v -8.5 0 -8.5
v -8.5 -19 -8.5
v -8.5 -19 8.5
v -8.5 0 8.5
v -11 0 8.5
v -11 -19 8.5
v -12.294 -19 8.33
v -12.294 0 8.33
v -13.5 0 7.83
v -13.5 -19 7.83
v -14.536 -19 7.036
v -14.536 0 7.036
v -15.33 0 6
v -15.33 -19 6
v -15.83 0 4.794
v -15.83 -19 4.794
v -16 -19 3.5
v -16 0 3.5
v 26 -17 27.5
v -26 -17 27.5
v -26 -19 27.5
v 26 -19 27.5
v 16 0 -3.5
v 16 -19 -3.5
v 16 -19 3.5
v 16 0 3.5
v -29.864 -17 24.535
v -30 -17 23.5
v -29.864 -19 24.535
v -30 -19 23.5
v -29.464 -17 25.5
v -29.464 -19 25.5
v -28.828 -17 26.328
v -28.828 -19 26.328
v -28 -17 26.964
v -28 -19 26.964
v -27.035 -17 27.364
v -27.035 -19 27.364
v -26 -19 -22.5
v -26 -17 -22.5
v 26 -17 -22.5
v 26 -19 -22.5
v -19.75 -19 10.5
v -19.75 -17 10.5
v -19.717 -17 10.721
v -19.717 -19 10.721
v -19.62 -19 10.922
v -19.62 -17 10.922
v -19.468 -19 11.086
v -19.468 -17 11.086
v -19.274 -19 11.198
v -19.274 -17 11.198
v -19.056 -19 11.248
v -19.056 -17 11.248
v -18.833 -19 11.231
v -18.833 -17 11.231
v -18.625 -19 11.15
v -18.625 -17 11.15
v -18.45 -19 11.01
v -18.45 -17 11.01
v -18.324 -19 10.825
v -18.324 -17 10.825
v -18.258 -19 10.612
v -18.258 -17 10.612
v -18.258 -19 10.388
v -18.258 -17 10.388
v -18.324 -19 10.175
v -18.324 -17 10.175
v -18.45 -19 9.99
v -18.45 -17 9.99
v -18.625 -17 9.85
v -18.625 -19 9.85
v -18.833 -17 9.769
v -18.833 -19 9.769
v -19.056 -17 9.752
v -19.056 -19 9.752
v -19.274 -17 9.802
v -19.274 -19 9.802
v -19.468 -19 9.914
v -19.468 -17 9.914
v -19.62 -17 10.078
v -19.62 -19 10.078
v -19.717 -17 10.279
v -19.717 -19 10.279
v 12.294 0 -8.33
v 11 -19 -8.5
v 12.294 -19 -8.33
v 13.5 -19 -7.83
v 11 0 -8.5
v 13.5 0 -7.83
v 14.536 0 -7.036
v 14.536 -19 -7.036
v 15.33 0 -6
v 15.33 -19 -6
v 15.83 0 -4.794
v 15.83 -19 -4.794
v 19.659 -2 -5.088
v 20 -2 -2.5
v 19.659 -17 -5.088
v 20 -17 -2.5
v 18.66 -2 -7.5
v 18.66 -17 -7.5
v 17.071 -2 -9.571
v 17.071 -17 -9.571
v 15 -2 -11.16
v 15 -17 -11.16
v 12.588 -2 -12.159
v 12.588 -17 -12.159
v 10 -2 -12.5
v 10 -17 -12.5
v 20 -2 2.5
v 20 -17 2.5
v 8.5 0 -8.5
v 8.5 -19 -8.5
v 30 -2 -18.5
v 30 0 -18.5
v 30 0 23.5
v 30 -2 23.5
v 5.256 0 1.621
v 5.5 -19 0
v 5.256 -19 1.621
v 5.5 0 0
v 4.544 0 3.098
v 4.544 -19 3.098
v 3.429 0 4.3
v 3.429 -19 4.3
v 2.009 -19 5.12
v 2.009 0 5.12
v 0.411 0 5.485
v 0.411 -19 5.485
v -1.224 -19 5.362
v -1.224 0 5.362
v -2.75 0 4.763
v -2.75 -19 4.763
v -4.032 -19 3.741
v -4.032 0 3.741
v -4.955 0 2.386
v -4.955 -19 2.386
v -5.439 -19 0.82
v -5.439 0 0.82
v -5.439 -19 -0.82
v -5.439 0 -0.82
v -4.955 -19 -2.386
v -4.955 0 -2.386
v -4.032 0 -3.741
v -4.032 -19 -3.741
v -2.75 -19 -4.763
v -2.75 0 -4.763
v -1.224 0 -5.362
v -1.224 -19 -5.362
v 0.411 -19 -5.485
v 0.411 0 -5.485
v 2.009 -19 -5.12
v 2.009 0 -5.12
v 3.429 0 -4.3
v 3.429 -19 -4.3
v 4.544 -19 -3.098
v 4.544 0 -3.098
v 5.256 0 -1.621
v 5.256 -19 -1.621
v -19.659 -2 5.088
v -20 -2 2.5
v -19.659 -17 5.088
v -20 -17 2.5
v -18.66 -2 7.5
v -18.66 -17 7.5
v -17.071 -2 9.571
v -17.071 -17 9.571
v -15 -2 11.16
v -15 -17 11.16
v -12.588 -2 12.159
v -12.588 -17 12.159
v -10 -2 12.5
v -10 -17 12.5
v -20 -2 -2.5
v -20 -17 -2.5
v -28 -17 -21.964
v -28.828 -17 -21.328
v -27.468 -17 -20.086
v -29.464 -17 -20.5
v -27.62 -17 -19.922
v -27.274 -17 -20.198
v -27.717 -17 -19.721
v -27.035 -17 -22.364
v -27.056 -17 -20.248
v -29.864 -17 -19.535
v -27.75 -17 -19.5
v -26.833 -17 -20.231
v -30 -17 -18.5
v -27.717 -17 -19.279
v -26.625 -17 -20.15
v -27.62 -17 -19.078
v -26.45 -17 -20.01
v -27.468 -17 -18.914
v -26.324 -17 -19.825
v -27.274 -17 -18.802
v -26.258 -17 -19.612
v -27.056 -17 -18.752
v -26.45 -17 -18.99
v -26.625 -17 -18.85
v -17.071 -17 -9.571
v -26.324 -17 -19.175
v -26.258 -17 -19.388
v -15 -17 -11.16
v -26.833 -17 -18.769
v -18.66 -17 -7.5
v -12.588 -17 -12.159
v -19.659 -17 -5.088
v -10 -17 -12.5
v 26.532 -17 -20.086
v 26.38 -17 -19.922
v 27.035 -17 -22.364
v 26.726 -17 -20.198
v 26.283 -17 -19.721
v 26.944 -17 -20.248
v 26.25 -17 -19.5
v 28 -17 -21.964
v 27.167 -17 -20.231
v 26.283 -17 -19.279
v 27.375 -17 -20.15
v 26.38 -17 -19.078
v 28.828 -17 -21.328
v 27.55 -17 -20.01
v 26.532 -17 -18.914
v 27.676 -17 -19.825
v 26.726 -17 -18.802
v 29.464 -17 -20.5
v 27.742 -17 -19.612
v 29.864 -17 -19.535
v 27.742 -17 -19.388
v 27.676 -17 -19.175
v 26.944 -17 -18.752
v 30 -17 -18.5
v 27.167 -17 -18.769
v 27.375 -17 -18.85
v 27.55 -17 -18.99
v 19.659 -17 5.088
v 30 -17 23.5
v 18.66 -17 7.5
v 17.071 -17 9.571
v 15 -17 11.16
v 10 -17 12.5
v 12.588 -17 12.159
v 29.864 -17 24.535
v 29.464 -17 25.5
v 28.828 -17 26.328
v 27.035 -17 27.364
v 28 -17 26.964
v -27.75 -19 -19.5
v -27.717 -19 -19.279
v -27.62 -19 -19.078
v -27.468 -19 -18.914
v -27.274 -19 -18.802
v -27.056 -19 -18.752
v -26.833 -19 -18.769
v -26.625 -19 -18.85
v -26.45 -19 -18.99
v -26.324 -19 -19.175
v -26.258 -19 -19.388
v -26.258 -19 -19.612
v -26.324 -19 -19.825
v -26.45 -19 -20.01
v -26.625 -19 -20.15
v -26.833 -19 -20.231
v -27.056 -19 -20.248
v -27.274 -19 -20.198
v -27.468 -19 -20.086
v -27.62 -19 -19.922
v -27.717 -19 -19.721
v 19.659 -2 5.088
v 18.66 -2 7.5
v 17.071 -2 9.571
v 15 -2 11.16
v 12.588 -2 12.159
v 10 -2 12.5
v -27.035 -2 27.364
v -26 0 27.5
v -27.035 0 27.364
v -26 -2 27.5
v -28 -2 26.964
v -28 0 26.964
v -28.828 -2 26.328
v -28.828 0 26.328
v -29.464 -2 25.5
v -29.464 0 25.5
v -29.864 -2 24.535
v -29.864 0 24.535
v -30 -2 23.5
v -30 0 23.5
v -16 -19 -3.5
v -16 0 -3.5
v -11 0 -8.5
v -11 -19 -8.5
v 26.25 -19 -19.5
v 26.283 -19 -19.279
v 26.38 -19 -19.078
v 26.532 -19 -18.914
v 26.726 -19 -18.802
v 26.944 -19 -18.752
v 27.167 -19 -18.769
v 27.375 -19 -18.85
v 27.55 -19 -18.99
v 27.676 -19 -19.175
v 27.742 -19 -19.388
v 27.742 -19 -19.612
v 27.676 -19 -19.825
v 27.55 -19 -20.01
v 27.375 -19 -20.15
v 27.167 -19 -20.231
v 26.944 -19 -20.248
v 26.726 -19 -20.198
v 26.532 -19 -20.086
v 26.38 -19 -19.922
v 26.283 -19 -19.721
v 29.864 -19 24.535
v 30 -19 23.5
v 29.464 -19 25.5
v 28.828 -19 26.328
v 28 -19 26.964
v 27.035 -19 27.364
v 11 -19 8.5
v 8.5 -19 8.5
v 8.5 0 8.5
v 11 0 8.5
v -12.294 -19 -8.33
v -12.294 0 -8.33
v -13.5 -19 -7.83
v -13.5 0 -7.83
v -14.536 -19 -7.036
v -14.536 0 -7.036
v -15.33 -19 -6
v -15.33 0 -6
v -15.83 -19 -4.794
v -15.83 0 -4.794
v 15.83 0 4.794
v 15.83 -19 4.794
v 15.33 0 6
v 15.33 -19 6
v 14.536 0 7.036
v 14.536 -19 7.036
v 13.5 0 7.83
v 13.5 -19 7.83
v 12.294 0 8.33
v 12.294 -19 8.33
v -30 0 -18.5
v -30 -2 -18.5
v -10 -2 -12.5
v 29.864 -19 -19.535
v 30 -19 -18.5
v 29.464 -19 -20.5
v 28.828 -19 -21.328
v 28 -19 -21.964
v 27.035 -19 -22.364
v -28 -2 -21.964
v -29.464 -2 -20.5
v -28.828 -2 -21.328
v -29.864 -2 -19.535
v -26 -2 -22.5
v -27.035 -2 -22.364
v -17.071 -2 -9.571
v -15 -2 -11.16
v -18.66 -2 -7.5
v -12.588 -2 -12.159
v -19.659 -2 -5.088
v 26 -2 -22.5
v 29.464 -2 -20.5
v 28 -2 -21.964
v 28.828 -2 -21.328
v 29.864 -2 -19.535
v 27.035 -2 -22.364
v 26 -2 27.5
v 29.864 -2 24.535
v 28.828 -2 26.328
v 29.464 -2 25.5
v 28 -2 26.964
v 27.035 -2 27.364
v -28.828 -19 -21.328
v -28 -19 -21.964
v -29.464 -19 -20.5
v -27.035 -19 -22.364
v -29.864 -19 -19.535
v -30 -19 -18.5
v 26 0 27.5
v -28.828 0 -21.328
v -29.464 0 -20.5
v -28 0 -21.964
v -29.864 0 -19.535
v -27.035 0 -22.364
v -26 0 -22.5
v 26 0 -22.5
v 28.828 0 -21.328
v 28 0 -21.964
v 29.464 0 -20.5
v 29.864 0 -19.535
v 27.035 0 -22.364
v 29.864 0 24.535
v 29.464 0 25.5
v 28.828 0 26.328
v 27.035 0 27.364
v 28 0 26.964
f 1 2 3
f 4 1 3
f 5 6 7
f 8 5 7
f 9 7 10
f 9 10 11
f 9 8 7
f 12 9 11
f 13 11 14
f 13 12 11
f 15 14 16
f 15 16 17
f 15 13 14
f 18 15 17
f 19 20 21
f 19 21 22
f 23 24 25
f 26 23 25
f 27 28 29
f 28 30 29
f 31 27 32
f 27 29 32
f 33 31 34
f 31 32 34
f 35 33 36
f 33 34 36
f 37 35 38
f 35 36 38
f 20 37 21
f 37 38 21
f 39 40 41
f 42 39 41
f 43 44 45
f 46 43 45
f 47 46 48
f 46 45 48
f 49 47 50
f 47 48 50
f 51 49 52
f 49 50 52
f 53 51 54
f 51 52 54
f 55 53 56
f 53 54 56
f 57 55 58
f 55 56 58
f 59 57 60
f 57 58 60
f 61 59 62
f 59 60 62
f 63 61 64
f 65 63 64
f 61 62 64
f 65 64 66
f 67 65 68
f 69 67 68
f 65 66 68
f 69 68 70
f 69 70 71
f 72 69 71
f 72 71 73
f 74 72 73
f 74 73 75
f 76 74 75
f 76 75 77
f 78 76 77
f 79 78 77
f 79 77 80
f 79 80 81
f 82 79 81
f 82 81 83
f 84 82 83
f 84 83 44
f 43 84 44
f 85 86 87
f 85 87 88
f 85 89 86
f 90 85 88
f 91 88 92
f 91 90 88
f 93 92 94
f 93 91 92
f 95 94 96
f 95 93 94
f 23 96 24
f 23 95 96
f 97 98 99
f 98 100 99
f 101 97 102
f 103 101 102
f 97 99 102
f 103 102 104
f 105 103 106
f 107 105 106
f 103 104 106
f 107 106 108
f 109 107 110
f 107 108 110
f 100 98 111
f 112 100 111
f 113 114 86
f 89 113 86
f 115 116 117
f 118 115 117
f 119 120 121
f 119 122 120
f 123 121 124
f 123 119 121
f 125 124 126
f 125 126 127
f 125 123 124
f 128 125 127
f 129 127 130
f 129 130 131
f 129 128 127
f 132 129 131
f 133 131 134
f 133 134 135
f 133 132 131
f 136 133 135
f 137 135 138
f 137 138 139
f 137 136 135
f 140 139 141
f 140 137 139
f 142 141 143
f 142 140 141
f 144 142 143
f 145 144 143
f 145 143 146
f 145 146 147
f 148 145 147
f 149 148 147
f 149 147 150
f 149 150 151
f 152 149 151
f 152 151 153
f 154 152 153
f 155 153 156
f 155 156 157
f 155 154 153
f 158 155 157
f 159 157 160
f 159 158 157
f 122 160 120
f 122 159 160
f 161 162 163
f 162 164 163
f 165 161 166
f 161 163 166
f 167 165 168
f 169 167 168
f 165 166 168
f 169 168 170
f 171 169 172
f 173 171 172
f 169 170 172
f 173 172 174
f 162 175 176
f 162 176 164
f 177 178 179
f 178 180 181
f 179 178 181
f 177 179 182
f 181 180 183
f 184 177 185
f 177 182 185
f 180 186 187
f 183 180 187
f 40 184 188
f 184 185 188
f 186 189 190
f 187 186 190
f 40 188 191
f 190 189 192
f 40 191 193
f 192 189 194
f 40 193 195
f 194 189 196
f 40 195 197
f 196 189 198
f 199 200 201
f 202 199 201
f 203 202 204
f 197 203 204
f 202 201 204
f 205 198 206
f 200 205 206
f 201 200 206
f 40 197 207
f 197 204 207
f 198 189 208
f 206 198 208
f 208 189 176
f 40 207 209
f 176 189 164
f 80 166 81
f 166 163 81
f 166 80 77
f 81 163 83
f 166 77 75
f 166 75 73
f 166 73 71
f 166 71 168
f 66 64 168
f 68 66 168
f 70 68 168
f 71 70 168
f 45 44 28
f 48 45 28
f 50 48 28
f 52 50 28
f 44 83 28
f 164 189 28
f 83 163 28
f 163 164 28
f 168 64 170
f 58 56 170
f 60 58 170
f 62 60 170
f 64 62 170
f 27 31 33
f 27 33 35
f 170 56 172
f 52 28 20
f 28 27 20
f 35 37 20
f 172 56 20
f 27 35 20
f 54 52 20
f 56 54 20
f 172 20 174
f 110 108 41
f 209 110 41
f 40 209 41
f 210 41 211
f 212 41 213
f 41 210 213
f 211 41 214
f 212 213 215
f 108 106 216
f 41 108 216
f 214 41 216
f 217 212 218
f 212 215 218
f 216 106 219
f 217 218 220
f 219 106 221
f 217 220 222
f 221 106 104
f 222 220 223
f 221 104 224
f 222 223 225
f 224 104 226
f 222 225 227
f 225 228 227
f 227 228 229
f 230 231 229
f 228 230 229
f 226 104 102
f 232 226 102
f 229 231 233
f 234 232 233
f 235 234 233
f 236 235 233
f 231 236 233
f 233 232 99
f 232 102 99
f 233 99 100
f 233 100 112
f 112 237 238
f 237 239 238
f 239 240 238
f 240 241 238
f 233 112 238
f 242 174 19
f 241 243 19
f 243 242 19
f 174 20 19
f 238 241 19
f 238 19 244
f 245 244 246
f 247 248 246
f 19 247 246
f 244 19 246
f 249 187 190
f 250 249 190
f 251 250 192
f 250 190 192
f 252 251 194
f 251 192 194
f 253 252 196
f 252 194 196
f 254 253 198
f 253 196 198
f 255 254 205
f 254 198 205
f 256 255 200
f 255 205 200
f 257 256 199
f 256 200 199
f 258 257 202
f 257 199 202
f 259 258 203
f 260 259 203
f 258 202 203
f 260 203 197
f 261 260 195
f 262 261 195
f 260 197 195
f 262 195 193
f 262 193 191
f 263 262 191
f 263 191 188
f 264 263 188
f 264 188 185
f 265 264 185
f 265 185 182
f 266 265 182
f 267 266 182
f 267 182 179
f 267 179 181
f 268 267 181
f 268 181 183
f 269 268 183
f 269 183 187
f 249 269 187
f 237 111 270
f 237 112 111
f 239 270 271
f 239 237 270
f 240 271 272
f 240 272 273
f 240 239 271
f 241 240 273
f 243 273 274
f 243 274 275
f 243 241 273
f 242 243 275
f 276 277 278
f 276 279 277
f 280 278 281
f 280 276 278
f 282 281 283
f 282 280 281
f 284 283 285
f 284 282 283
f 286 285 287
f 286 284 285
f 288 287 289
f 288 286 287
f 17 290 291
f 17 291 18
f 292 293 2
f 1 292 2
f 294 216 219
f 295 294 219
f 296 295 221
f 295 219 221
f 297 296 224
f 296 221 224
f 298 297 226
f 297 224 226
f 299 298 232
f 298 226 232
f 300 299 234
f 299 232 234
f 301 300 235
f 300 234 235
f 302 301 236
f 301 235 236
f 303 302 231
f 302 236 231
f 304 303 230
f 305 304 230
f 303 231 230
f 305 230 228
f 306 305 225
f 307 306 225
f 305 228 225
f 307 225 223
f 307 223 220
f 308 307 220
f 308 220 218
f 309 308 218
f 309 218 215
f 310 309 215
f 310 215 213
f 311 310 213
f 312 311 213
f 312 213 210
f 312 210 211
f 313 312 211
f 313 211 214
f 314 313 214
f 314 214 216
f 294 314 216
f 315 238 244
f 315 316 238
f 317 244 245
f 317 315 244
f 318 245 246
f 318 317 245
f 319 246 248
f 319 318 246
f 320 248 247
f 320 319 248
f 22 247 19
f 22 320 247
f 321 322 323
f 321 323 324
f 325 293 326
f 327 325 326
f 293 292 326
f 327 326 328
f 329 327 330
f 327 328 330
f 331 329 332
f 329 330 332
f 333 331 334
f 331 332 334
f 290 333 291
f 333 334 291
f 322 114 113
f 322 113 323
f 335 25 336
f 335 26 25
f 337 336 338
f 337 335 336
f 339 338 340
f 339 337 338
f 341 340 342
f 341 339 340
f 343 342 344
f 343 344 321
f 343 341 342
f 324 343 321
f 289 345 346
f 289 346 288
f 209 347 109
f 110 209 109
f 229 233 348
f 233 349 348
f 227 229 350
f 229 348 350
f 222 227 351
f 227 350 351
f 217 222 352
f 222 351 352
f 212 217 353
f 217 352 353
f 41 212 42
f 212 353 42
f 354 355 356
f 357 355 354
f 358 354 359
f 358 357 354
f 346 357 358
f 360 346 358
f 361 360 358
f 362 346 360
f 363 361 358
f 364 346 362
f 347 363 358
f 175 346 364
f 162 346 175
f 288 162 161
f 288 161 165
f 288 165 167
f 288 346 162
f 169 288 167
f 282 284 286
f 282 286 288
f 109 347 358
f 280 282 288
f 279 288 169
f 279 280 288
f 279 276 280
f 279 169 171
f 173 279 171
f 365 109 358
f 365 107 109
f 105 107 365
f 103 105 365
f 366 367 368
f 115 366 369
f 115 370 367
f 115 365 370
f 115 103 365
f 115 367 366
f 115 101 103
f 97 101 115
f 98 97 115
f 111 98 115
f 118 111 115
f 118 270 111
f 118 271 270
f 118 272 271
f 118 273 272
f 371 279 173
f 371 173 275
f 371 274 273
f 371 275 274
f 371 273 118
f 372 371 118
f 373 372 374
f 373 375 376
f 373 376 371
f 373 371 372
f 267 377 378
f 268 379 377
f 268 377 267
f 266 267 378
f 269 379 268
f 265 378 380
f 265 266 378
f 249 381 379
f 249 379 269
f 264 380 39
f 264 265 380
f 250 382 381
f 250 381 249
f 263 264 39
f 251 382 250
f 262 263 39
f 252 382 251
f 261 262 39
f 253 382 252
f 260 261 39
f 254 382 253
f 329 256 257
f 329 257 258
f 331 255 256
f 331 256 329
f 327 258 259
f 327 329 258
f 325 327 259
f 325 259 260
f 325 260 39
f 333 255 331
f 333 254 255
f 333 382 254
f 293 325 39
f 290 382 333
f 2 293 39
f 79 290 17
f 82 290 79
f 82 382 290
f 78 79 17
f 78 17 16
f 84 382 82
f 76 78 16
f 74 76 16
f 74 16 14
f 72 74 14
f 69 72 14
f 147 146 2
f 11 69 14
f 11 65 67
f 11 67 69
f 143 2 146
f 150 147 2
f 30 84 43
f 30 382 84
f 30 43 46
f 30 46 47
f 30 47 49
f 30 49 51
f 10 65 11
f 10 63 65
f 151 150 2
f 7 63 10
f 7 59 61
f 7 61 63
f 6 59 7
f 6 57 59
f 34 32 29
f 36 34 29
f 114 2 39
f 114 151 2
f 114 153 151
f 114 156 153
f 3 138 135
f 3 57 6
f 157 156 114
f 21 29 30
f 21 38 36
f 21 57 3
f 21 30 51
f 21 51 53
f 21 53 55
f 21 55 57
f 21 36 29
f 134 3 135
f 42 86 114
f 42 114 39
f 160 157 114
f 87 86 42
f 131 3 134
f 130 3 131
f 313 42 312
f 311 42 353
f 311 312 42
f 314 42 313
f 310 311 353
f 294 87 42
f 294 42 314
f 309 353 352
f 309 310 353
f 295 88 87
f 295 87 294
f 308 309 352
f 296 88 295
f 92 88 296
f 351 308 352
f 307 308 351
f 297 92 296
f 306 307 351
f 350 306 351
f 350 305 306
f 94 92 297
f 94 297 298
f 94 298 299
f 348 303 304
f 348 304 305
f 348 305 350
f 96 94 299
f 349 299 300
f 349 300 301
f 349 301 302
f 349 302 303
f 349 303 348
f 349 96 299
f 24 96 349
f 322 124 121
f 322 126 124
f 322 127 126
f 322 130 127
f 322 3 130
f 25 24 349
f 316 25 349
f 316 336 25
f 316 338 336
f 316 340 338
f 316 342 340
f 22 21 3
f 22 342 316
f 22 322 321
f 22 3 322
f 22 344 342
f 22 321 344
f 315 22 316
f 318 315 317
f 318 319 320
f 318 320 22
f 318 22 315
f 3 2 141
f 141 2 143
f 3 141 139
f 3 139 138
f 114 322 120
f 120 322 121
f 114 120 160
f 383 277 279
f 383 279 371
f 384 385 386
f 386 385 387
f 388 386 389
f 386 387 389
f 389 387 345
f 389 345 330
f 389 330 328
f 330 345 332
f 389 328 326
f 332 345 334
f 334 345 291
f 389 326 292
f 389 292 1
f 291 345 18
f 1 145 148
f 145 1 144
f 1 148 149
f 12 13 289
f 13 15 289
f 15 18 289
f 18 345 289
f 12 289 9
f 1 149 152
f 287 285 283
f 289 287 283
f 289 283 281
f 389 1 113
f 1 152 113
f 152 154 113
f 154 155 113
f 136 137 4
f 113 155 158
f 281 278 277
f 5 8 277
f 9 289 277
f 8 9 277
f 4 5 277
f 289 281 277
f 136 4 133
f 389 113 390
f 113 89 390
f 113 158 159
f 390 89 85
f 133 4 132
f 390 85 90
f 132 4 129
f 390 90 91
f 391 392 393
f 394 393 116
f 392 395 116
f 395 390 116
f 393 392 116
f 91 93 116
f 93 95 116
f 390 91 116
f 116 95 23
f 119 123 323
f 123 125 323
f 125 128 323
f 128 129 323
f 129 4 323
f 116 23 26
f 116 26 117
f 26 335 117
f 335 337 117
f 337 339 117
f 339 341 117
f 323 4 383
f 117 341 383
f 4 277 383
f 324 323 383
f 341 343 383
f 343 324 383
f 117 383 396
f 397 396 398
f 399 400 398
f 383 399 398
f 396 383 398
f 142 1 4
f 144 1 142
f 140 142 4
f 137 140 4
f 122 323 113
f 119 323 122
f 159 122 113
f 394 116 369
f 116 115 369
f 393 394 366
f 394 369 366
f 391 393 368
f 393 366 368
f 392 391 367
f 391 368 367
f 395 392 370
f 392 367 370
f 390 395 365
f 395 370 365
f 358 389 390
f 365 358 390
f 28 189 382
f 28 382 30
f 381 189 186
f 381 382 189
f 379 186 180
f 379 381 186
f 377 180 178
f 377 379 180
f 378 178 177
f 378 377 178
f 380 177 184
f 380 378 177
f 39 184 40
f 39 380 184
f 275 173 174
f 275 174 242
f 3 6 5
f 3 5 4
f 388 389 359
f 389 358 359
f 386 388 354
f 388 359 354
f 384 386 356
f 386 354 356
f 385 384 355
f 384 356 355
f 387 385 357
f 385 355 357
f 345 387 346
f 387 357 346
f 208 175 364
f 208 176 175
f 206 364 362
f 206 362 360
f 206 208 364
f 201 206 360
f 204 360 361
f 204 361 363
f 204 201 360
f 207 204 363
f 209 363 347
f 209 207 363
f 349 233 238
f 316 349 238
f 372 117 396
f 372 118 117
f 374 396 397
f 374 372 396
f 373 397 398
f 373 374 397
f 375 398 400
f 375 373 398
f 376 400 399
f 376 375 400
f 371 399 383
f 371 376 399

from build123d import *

# Parameters (mm, degrees)
F0_W      = 60
F0_H      = 50
F0_R      = 5.5
F1_DEPTH  = 2
F2_W      = 40
F2_H      = 25
F2_R      = 5.5
F3_DEPTH  = 15
F4_R      = 10
F5_W      = 60
F5_H      = 50
F5_R      = 5.5
F6_DEPTH  = 2
F7_R      = 4
F9_D      = 1.5
F9_DEPTH  = 3
F9_TIP    = 0.4506454643
F10_W     = 7.5
F10_H     = 17
F11_DEPTH = 25
F12_R     = 5


# Not quite as in the source:
# - a feature names something its author has since deleted; it is built from what else it names


with BuildPart() as f1:
    # F0 (on Front) → F1 (new body)
    with BuildSketch(Plane.XZ):
        with Locations((0, 2.5)):
            Rectangle(F0_W, F0_H)
        Circle(F0_R, mode=Mode.SUBTRACT)
    extrude(amount=F1_DEPTH)

    # F2 (on face) → F3 (join)
    with BuildSketch(Plane.XZ.offset(2)):
        Rectangle(F2_W, F2_H)
        Circle(F2_R, mode=Mode.SUBTRACT)
    extrude(amount=F3_DEPTH)

    # F4
    f4_edges = [f1.edges().sort_by_distance(p)[0] for p in [
        (20, -9.5, 12.5),
        (20, -9.5, -12.5),
        (-20, -9.5, -12.5),
        (-20, -9.5, 12.5),
    ]]
    fillet(f4_edges, radius=F4_R)

    # F5 (on face) → F6 (join)
    with BuildSketch(Plane.XZ.offset(17)):
        with Locations((0, 2.5)):
            Rectangle(F5_W, F5_H)
        Circle(F5_R, mode=Mode.SUBTRACT)
    extrude(amount=F6_DEPTH)

    # F7
    f7_edges = [f1.edges().sort_by_distance(p)[0] for p in [
        (30, -18, 27.5),
        (30, -1, 27.5),
        (30, -18, -22.5),
        (30, -1, -22.5),
        (-30, -18, -22.5),
        (-30, -1, -22.5),
        (-30, -18, 27.5),
        (-30, -1, 27.5),
    ]]
    fillet(f7_edges, radius=F7_R)

    # F9
    with Locations(Plane.XZ.offset(19)):
        with Locations((-19, 10.5), (-27, -19.5), (27, -19.5)):
            Hole(F9_D / 2, depth=F9_DEPTH)
            with Locations((0, 0, -(F9_DEPTH + F9_TIP / 2))):  # 118° drill point
                Cone(0, F9_D / 2, F9_TIP, mode=Mode.SUBTRACT)

    # F10 (on face) → F11 (cut)
    with BuildSketch(Plane.XZ.offset(19)):
        with Locations((-12.25, 0)):
            Rectangle(F10_W, F10_H)
        with Locations((12.25, 0)):
            Rectangle(F10_W, F10_H)
    extrude(amount=-F11_DEPTH, mode=Mode.SUBTRACT)

    # F12
    f12_edges = [f1.edges().sort_by_distance(p)[0] for p in [
        (16, -9.5, -8.5),
        (16, -9.5, 8.5),
        (-16, -9.5, 8.5),
        (-16, -9.5, -8.5),
    ]]
    fillet(f12_edges, radius=F12_R)


solid = f1.part
